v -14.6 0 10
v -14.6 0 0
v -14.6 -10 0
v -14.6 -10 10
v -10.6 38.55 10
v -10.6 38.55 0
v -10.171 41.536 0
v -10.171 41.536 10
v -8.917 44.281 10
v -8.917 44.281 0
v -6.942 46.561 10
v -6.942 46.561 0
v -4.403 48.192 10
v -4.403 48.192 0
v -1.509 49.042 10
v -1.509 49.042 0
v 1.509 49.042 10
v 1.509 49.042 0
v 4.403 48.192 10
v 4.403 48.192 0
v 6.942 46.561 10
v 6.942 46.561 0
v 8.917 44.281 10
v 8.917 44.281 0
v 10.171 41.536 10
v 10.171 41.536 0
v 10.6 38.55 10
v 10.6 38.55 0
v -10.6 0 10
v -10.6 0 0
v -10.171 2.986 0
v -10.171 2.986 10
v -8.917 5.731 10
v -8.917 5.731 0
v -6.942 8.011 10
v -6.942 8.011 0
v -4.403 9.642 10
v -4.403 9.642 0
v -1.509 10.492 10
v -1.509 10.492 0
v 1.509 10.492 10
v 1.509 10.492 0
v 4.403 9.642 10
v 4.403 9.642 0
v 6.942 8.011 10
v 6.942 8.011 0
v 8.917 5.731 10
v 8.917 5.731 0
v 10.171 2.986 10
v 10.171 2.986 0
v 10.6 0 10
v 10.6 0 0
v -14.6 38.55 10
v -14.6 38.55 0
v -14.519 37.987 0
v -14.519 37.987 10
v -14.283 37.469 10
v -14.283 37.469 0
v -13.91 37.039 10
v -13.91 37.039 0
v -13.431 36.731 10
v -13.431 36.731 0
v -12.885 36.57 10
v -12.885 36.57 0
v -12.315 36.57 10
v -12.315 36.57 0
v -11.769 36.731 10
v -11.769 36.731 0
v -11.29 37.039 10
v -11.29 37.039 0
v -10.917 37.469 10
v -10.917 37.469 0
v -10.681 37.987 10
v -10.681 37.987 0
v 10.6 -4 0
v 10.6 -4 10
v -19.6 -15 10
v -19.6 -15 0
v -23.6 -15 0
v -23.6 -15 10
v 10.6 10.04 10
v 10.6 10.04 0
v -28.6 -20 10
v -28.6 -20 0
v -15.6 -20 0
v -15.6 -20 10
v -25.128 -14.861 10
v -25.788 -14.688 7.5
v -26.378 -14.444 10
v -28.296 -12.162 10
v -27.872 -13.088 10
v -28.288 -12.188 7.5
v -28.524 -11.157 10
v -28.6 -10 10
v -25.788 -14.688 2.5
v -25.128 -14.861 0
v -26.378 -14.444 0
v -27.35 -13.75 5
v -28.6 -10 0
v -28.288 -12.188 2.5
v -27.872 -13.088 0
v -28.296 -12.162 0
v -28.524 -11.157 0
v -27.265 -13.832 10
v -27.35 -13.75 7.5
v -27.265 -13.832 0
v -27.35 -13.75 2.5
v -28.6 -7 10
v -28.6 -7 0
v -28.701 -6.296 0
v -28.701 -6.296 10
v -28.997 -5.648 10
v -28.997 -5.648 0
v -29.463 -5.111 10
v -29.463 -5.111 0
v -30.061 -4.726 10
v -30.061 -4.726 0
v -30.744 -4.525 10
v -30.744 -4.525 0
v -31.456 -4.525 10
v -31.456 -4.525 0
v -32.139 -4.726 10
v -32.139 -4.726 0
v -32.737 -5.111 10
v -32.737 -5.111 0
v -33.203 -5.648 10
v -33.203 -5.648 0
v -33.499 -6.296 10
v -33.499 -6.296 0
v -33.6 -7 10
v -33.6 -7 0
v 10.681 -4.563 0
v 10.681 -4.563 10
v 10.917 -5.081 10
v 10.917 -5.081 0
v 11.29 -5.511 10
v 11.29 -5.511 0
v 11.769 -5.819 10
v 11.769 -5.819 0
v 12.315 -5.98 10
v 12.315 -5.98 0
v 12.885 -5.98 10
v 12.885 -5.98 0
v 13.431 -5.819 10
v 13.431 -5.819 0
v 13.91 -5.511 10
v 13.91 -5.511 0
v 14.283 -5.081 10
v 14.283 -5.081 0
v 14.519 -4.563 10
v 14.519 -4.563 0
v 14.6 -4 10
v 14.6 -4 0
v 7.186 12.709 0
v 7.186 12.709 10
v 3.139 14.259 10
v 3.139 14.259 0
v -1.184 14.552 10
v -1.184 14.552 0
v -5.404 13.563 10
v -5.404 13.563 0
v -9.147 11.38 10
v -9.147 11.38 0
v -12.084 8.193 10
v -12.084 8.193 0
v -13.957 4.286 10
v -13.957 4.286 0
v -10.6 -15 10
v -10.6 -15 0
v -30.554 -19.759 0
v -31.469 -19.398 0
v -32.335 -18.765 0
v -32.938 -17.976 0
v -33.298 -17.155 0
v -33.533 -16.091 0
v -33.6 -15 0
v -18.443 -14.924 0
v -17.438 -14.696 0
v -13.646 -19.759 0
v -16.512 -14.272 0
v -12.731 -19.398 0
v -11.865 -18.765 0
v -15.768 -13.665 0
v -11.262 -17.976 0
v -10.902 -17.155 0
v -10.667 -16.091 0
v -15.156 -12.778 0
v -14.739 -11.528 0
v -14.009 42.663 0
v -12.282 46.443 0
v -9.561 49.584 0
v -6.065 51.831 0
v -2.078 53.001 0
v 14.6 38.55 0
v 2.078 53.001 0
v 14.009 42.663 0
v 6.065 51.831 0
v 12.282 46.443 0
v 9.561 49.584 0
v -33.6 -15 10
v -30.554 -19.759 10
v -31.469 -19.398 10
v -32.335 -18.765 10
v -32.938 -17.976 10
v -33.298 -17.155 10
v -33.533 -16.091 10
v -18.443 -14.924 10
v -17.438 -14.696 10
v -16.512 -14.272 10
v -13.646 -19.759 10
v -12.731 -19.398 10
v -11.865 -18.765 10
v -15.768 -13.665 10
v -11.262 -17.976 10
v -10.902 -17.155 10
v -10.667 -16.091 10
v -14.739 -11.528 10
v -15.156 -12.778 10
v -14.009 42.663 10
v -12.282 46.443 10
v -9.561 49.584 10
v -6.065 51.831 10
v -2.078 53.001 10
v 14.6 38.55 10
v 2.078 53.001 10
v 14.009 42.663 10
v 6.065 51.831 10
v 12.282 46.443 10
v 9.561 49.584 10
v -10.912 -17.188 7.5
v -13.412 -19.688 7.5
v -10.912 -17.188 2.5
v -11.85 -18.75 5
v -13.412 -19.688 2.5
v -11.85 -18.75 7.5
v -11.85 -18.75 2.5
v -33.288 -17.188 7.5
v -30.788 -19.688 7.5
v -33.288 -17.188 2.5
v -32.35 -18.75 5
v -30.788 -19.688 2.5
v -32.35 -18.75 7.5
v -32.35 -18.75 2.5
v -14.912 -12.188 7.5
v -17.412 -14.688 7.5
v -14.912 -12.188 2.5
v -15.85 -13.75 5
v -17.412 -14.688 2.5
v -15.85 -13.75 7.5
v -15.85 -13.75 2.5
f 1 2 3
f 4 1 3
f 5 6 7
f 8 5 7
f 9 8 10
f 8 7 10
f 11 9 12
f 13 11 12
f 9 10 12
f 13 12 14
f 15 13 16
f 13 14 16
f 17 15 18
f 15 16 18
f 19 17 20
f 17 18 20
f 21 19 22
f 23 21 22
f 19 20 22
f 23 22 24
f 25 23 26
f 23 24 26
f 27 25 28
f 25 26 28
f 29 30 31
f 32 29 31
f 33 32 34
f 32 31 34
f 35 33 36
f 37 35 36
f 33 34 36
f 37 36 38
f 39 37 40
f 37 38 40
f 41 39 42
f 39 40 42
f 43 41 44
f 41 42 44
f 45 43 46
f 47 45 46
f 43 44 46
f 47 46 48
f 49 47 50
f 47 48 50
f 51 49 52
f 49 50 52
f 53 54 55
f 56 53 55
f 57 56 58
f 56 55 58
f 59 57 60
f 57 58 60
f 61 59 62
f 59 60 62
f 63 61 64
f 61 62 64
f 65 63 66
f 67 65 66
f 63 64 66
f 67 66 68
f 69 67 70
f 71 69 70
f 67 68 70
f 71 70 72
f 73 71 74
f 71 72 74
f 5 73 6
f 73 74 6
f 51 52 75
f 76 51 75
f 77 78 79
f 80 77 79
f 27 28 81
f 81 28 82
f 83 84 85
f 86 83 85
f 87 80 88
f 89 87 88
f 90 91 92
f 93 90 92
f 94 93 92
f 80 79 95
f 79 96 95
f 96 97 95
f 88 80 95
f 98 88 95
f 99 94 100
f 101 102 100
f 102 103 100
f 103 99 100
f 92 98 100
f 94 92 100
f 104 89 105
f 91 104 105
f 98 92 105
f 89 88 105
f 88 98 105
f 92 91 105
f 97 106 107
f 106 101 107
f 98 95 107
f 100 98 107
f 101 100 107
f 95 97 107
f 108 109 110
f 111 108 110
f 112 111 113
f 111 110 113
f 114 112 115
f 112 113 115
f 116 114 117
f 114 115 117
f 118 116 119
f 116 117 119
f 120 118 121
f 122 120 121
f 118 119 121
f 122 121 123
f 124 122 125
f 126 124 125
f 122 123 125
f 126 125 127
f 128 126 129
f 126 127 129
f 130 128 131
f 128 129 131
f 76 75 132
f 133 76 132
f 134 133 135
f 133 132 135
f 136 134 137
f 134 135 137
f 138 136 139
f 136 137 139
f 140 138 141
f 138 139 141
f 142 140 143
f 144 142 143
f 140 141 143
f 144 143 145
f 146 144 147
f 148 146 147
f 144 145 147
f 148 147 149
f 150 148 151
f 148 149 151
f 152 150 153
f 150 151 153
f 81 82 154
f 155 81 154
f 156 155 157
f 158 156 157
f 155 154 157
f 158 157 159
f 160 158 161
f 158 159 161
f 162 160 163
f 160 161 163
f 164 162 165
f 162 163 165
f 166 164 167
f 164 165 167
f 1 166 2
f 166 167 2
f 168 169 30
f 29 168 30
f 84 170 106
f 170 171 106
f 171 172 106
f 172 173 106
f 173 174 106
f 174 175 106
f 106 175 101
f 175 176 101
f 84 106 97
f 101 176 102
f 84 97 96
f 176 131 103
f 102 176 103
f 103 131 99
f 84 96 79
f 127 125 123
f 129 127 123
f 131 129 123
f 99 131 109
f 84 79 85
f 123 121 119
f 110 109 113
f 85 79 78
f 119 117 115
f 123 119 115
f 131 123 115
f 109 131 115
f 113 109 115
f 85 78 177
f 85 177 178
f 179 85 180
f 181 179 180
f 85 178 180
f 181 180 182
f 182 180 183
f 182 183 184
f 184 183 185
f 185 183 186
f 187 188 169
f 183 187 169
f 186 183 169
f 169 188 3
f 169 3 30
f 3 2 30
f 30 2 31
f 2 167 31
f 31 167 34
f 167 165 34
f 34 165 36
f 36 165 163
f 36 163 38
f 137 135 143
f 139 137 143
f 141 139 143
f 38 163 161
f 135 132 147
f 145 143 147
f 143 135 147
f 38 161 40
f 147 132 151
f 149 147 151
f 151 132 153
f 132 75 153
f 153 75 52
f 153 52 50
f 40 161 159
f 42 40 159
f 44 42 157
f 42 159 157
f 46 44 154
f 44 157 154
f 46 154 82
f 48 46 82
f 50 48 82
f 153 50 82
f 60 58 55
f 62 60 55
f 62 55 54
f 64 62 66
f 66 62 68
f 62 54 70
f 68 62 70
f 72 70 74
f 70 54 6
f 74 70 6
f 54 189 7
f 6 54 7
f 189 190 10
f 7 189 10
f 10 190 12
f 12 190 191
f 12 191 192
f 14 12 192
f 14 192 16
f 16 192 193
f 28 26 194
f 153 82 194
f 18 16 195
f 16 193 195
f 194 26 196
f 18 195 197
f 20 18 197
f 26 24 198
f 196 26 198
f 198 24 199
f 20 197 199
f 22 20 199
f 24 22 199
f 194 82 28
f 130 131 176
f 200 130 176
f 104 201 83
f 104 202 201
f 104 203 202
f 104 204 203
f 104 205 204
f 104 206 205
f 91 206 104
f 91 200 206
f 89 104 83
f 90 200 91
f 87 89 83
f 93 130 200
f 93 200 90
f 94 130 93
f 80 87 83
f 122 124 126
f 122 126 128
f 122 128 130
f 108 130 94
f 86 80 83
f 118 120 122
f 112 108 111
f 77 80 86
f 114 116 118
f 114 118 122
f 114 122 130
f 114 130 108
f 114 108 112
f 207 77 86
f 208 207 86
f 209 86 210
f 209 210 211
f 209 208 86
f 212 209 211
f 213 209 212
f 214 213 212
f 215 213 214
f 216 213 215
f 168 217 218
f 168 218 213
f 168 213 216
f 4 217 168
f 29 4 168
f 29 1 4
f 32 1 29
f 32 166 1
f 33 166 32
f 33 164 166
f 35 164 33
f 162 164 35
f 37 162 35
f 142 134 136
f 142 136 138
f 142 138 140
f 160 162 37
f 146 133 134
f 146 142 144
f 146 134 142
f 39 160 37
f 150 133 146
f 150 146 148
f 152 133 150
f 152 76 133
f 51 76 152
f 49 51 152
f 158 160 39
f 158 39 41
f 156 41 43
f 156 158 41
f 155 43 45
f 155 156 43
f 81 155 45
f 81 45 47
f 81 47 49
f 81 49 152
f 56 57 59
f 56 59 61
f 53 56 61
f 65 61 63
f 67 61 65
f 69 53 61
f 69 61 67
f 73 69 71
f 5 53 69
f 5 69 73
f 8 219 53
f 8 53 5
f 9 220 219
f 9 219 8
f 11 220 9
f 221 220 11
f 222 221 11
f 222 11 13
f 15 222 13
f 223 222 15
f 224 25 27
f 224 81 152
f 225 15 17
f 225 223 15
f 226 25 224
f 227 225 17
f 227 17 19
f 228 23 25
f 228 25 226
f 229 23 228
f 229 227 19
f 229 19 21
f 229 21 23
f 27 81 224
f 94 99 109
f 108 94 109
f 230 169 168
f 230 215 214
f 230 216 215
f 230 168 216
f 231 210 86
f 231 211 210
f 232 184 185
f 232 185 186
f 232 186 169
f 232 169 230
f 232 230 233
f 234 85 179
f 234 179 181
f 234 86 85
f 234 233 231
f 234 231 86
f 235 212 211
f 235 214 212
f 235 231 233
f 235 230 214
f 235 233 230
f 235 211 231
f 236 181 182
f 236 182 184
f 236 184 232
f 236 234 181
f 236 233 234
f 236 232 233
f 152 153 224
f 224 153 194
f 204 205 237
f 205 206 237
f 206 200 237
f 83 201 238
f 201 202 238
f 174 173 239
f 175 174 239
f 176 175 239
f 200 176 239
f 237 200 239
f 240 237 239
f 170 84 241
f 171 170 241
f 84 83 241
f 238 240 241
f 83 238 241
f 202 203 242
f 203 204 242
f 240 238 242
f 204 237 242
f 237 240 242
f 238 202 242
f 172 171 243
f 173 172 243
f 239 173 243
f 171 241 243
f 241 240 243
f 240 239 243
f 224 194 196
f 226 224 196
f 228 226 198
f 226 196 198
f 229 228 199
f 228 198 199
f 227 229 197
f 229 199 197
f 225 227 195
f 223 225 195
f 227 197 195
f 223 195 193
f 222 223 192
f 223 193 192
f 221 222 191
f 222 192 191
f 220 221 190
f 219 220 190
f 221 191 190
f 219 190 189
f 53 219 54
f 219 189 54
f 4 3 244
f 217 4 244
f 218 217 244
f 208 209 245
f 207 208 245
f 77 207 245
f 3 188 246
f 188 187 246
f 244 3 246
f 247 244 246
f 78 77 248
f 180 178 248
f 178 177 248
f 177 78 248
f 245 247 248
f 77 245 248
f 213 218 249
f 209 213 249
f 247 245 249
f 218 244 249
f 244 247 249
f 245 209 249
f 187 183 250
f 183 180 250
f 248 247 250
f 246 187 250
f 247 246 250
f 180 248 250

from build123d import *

# Parameters (mm, degrees)
F1_DEPTH    = 10
F2_T1_DEPTH = 10
F2_T3_DEPTH = 35


# Not quite as in the source:
# - a fillet or chamfer that OpenCascade refuses, or shapes differently, is made with other operations: its cross-section is extruded or revolved along the edge and cut away or added


with BuildPart() as f1:
    # F0 (on Top) → F1 (new body)
    with BuildSketch(Plane.XY):
        with BuildLine():
            Line((14.6, -4), (14.6, 38.55))
            ThreePointArc((14.6, 38.55), (0, 53.15), (-14.6, 38.55))
            ThreePointArc((-14.6, 38.55), (-12.6, 36.55), (-10.6, 38.55))
            ThreePointArc((-10.6, 38.55), (0, 49.15), (10.6, 38.55))
            Line((10.6, 38.55), (10.6, 10.0399203184))
            ThreePointArc((10.6, 10.0399203184), (-5.4037024344, 13.5631854665), (-14.6, 0))
            Line((-14.6, 0), (-14.6, -15))
            Line((-14.6, -15), (-28.6, -15))
            Line((-28.6, -15), (-28.6, -7))
            ThreePointArc((-28.6, -7), (-31.1, -4.5), (-33.6, -7))
            Line((-33.6, -7), (-33.6, -20))
            Line((-33.6, -20), (-10.6, -20))
            Line((-10.6, -20), (-10.6, 0))
            ThreePointArc((-10.6, 0), (0, 10.6), (10.6, 0))
            Line((10.6, 0), (10.6, -4))
            ThreePointArc((10.6, -4), (12.6, -6), (14.6, -4))
        make_face()
    extrude(amount=F1_DEPTH)

    # F2: fillet of radius 5 on 4 edges, made by hand

    # F2_s2 → F2_t1 (join)
    with BuildSketch(Plane.XY):
        with BuildLine():
            add(Edge.make_bspline(
                [(-14.6, -10), (-14.6, -15), (-19.6, -15)],
                knots=[0, 0, 0, 1, 1, 1], degree=2, weights=[1, 1, 1]))
            Line((-19.6, -15), (-14.6, -15))
            Line((-14.6, -15), (-14.6, -10))
        make_face()
        with BuildLine():
            add(Edge.make_bspline(
                [(-23.6, -15), (-28.6, -15), (-28.6, -10)],
                knots=[0, 0, 0, 1, 1, 1], degree=2, weights=[1, 1, 1]))
            Line((-28.6, -10), (-28.6, -15))
            Line((-28.6, -15), (-23.6, -15))
        make_face()
    extrude(amount=F2_T1_DEPTH)

    # F2_s4 → F2_t3 (cut)
    with BuildSketch(Plane.XY.offset(-12.5)):
        with BuildLine():
            add(Edge.make_bspline(
                [(-33.6, -15), (-33.6, -20), (-28.6, -20)],
                knots=[0, 0, 0, 1, 1, 1], degree=2, weights=[1, 1, 1]))
            Line((-28.6, -20), (-33.6, -20))
            Line((-33.6, -20), (-33.6, -15))
        make_face()
        with BuildLine():
            add(Edge.make_bspline(
                [(-10.6, -15), (-10.6, -20), (-15.6, -20)],
                knots=[0, 0, 0, 1, 1, 1], degree=2, weights=[1, 1, 1]))
            Line((-15.6, -20), (-10.6, -20))
            Line((-10.6, -20), (-10.6, -15))
        make_face()
    extrude(amount=F2_T3_DEPTH, mode=Mode.SUBTRACT)


solid = f1.part
